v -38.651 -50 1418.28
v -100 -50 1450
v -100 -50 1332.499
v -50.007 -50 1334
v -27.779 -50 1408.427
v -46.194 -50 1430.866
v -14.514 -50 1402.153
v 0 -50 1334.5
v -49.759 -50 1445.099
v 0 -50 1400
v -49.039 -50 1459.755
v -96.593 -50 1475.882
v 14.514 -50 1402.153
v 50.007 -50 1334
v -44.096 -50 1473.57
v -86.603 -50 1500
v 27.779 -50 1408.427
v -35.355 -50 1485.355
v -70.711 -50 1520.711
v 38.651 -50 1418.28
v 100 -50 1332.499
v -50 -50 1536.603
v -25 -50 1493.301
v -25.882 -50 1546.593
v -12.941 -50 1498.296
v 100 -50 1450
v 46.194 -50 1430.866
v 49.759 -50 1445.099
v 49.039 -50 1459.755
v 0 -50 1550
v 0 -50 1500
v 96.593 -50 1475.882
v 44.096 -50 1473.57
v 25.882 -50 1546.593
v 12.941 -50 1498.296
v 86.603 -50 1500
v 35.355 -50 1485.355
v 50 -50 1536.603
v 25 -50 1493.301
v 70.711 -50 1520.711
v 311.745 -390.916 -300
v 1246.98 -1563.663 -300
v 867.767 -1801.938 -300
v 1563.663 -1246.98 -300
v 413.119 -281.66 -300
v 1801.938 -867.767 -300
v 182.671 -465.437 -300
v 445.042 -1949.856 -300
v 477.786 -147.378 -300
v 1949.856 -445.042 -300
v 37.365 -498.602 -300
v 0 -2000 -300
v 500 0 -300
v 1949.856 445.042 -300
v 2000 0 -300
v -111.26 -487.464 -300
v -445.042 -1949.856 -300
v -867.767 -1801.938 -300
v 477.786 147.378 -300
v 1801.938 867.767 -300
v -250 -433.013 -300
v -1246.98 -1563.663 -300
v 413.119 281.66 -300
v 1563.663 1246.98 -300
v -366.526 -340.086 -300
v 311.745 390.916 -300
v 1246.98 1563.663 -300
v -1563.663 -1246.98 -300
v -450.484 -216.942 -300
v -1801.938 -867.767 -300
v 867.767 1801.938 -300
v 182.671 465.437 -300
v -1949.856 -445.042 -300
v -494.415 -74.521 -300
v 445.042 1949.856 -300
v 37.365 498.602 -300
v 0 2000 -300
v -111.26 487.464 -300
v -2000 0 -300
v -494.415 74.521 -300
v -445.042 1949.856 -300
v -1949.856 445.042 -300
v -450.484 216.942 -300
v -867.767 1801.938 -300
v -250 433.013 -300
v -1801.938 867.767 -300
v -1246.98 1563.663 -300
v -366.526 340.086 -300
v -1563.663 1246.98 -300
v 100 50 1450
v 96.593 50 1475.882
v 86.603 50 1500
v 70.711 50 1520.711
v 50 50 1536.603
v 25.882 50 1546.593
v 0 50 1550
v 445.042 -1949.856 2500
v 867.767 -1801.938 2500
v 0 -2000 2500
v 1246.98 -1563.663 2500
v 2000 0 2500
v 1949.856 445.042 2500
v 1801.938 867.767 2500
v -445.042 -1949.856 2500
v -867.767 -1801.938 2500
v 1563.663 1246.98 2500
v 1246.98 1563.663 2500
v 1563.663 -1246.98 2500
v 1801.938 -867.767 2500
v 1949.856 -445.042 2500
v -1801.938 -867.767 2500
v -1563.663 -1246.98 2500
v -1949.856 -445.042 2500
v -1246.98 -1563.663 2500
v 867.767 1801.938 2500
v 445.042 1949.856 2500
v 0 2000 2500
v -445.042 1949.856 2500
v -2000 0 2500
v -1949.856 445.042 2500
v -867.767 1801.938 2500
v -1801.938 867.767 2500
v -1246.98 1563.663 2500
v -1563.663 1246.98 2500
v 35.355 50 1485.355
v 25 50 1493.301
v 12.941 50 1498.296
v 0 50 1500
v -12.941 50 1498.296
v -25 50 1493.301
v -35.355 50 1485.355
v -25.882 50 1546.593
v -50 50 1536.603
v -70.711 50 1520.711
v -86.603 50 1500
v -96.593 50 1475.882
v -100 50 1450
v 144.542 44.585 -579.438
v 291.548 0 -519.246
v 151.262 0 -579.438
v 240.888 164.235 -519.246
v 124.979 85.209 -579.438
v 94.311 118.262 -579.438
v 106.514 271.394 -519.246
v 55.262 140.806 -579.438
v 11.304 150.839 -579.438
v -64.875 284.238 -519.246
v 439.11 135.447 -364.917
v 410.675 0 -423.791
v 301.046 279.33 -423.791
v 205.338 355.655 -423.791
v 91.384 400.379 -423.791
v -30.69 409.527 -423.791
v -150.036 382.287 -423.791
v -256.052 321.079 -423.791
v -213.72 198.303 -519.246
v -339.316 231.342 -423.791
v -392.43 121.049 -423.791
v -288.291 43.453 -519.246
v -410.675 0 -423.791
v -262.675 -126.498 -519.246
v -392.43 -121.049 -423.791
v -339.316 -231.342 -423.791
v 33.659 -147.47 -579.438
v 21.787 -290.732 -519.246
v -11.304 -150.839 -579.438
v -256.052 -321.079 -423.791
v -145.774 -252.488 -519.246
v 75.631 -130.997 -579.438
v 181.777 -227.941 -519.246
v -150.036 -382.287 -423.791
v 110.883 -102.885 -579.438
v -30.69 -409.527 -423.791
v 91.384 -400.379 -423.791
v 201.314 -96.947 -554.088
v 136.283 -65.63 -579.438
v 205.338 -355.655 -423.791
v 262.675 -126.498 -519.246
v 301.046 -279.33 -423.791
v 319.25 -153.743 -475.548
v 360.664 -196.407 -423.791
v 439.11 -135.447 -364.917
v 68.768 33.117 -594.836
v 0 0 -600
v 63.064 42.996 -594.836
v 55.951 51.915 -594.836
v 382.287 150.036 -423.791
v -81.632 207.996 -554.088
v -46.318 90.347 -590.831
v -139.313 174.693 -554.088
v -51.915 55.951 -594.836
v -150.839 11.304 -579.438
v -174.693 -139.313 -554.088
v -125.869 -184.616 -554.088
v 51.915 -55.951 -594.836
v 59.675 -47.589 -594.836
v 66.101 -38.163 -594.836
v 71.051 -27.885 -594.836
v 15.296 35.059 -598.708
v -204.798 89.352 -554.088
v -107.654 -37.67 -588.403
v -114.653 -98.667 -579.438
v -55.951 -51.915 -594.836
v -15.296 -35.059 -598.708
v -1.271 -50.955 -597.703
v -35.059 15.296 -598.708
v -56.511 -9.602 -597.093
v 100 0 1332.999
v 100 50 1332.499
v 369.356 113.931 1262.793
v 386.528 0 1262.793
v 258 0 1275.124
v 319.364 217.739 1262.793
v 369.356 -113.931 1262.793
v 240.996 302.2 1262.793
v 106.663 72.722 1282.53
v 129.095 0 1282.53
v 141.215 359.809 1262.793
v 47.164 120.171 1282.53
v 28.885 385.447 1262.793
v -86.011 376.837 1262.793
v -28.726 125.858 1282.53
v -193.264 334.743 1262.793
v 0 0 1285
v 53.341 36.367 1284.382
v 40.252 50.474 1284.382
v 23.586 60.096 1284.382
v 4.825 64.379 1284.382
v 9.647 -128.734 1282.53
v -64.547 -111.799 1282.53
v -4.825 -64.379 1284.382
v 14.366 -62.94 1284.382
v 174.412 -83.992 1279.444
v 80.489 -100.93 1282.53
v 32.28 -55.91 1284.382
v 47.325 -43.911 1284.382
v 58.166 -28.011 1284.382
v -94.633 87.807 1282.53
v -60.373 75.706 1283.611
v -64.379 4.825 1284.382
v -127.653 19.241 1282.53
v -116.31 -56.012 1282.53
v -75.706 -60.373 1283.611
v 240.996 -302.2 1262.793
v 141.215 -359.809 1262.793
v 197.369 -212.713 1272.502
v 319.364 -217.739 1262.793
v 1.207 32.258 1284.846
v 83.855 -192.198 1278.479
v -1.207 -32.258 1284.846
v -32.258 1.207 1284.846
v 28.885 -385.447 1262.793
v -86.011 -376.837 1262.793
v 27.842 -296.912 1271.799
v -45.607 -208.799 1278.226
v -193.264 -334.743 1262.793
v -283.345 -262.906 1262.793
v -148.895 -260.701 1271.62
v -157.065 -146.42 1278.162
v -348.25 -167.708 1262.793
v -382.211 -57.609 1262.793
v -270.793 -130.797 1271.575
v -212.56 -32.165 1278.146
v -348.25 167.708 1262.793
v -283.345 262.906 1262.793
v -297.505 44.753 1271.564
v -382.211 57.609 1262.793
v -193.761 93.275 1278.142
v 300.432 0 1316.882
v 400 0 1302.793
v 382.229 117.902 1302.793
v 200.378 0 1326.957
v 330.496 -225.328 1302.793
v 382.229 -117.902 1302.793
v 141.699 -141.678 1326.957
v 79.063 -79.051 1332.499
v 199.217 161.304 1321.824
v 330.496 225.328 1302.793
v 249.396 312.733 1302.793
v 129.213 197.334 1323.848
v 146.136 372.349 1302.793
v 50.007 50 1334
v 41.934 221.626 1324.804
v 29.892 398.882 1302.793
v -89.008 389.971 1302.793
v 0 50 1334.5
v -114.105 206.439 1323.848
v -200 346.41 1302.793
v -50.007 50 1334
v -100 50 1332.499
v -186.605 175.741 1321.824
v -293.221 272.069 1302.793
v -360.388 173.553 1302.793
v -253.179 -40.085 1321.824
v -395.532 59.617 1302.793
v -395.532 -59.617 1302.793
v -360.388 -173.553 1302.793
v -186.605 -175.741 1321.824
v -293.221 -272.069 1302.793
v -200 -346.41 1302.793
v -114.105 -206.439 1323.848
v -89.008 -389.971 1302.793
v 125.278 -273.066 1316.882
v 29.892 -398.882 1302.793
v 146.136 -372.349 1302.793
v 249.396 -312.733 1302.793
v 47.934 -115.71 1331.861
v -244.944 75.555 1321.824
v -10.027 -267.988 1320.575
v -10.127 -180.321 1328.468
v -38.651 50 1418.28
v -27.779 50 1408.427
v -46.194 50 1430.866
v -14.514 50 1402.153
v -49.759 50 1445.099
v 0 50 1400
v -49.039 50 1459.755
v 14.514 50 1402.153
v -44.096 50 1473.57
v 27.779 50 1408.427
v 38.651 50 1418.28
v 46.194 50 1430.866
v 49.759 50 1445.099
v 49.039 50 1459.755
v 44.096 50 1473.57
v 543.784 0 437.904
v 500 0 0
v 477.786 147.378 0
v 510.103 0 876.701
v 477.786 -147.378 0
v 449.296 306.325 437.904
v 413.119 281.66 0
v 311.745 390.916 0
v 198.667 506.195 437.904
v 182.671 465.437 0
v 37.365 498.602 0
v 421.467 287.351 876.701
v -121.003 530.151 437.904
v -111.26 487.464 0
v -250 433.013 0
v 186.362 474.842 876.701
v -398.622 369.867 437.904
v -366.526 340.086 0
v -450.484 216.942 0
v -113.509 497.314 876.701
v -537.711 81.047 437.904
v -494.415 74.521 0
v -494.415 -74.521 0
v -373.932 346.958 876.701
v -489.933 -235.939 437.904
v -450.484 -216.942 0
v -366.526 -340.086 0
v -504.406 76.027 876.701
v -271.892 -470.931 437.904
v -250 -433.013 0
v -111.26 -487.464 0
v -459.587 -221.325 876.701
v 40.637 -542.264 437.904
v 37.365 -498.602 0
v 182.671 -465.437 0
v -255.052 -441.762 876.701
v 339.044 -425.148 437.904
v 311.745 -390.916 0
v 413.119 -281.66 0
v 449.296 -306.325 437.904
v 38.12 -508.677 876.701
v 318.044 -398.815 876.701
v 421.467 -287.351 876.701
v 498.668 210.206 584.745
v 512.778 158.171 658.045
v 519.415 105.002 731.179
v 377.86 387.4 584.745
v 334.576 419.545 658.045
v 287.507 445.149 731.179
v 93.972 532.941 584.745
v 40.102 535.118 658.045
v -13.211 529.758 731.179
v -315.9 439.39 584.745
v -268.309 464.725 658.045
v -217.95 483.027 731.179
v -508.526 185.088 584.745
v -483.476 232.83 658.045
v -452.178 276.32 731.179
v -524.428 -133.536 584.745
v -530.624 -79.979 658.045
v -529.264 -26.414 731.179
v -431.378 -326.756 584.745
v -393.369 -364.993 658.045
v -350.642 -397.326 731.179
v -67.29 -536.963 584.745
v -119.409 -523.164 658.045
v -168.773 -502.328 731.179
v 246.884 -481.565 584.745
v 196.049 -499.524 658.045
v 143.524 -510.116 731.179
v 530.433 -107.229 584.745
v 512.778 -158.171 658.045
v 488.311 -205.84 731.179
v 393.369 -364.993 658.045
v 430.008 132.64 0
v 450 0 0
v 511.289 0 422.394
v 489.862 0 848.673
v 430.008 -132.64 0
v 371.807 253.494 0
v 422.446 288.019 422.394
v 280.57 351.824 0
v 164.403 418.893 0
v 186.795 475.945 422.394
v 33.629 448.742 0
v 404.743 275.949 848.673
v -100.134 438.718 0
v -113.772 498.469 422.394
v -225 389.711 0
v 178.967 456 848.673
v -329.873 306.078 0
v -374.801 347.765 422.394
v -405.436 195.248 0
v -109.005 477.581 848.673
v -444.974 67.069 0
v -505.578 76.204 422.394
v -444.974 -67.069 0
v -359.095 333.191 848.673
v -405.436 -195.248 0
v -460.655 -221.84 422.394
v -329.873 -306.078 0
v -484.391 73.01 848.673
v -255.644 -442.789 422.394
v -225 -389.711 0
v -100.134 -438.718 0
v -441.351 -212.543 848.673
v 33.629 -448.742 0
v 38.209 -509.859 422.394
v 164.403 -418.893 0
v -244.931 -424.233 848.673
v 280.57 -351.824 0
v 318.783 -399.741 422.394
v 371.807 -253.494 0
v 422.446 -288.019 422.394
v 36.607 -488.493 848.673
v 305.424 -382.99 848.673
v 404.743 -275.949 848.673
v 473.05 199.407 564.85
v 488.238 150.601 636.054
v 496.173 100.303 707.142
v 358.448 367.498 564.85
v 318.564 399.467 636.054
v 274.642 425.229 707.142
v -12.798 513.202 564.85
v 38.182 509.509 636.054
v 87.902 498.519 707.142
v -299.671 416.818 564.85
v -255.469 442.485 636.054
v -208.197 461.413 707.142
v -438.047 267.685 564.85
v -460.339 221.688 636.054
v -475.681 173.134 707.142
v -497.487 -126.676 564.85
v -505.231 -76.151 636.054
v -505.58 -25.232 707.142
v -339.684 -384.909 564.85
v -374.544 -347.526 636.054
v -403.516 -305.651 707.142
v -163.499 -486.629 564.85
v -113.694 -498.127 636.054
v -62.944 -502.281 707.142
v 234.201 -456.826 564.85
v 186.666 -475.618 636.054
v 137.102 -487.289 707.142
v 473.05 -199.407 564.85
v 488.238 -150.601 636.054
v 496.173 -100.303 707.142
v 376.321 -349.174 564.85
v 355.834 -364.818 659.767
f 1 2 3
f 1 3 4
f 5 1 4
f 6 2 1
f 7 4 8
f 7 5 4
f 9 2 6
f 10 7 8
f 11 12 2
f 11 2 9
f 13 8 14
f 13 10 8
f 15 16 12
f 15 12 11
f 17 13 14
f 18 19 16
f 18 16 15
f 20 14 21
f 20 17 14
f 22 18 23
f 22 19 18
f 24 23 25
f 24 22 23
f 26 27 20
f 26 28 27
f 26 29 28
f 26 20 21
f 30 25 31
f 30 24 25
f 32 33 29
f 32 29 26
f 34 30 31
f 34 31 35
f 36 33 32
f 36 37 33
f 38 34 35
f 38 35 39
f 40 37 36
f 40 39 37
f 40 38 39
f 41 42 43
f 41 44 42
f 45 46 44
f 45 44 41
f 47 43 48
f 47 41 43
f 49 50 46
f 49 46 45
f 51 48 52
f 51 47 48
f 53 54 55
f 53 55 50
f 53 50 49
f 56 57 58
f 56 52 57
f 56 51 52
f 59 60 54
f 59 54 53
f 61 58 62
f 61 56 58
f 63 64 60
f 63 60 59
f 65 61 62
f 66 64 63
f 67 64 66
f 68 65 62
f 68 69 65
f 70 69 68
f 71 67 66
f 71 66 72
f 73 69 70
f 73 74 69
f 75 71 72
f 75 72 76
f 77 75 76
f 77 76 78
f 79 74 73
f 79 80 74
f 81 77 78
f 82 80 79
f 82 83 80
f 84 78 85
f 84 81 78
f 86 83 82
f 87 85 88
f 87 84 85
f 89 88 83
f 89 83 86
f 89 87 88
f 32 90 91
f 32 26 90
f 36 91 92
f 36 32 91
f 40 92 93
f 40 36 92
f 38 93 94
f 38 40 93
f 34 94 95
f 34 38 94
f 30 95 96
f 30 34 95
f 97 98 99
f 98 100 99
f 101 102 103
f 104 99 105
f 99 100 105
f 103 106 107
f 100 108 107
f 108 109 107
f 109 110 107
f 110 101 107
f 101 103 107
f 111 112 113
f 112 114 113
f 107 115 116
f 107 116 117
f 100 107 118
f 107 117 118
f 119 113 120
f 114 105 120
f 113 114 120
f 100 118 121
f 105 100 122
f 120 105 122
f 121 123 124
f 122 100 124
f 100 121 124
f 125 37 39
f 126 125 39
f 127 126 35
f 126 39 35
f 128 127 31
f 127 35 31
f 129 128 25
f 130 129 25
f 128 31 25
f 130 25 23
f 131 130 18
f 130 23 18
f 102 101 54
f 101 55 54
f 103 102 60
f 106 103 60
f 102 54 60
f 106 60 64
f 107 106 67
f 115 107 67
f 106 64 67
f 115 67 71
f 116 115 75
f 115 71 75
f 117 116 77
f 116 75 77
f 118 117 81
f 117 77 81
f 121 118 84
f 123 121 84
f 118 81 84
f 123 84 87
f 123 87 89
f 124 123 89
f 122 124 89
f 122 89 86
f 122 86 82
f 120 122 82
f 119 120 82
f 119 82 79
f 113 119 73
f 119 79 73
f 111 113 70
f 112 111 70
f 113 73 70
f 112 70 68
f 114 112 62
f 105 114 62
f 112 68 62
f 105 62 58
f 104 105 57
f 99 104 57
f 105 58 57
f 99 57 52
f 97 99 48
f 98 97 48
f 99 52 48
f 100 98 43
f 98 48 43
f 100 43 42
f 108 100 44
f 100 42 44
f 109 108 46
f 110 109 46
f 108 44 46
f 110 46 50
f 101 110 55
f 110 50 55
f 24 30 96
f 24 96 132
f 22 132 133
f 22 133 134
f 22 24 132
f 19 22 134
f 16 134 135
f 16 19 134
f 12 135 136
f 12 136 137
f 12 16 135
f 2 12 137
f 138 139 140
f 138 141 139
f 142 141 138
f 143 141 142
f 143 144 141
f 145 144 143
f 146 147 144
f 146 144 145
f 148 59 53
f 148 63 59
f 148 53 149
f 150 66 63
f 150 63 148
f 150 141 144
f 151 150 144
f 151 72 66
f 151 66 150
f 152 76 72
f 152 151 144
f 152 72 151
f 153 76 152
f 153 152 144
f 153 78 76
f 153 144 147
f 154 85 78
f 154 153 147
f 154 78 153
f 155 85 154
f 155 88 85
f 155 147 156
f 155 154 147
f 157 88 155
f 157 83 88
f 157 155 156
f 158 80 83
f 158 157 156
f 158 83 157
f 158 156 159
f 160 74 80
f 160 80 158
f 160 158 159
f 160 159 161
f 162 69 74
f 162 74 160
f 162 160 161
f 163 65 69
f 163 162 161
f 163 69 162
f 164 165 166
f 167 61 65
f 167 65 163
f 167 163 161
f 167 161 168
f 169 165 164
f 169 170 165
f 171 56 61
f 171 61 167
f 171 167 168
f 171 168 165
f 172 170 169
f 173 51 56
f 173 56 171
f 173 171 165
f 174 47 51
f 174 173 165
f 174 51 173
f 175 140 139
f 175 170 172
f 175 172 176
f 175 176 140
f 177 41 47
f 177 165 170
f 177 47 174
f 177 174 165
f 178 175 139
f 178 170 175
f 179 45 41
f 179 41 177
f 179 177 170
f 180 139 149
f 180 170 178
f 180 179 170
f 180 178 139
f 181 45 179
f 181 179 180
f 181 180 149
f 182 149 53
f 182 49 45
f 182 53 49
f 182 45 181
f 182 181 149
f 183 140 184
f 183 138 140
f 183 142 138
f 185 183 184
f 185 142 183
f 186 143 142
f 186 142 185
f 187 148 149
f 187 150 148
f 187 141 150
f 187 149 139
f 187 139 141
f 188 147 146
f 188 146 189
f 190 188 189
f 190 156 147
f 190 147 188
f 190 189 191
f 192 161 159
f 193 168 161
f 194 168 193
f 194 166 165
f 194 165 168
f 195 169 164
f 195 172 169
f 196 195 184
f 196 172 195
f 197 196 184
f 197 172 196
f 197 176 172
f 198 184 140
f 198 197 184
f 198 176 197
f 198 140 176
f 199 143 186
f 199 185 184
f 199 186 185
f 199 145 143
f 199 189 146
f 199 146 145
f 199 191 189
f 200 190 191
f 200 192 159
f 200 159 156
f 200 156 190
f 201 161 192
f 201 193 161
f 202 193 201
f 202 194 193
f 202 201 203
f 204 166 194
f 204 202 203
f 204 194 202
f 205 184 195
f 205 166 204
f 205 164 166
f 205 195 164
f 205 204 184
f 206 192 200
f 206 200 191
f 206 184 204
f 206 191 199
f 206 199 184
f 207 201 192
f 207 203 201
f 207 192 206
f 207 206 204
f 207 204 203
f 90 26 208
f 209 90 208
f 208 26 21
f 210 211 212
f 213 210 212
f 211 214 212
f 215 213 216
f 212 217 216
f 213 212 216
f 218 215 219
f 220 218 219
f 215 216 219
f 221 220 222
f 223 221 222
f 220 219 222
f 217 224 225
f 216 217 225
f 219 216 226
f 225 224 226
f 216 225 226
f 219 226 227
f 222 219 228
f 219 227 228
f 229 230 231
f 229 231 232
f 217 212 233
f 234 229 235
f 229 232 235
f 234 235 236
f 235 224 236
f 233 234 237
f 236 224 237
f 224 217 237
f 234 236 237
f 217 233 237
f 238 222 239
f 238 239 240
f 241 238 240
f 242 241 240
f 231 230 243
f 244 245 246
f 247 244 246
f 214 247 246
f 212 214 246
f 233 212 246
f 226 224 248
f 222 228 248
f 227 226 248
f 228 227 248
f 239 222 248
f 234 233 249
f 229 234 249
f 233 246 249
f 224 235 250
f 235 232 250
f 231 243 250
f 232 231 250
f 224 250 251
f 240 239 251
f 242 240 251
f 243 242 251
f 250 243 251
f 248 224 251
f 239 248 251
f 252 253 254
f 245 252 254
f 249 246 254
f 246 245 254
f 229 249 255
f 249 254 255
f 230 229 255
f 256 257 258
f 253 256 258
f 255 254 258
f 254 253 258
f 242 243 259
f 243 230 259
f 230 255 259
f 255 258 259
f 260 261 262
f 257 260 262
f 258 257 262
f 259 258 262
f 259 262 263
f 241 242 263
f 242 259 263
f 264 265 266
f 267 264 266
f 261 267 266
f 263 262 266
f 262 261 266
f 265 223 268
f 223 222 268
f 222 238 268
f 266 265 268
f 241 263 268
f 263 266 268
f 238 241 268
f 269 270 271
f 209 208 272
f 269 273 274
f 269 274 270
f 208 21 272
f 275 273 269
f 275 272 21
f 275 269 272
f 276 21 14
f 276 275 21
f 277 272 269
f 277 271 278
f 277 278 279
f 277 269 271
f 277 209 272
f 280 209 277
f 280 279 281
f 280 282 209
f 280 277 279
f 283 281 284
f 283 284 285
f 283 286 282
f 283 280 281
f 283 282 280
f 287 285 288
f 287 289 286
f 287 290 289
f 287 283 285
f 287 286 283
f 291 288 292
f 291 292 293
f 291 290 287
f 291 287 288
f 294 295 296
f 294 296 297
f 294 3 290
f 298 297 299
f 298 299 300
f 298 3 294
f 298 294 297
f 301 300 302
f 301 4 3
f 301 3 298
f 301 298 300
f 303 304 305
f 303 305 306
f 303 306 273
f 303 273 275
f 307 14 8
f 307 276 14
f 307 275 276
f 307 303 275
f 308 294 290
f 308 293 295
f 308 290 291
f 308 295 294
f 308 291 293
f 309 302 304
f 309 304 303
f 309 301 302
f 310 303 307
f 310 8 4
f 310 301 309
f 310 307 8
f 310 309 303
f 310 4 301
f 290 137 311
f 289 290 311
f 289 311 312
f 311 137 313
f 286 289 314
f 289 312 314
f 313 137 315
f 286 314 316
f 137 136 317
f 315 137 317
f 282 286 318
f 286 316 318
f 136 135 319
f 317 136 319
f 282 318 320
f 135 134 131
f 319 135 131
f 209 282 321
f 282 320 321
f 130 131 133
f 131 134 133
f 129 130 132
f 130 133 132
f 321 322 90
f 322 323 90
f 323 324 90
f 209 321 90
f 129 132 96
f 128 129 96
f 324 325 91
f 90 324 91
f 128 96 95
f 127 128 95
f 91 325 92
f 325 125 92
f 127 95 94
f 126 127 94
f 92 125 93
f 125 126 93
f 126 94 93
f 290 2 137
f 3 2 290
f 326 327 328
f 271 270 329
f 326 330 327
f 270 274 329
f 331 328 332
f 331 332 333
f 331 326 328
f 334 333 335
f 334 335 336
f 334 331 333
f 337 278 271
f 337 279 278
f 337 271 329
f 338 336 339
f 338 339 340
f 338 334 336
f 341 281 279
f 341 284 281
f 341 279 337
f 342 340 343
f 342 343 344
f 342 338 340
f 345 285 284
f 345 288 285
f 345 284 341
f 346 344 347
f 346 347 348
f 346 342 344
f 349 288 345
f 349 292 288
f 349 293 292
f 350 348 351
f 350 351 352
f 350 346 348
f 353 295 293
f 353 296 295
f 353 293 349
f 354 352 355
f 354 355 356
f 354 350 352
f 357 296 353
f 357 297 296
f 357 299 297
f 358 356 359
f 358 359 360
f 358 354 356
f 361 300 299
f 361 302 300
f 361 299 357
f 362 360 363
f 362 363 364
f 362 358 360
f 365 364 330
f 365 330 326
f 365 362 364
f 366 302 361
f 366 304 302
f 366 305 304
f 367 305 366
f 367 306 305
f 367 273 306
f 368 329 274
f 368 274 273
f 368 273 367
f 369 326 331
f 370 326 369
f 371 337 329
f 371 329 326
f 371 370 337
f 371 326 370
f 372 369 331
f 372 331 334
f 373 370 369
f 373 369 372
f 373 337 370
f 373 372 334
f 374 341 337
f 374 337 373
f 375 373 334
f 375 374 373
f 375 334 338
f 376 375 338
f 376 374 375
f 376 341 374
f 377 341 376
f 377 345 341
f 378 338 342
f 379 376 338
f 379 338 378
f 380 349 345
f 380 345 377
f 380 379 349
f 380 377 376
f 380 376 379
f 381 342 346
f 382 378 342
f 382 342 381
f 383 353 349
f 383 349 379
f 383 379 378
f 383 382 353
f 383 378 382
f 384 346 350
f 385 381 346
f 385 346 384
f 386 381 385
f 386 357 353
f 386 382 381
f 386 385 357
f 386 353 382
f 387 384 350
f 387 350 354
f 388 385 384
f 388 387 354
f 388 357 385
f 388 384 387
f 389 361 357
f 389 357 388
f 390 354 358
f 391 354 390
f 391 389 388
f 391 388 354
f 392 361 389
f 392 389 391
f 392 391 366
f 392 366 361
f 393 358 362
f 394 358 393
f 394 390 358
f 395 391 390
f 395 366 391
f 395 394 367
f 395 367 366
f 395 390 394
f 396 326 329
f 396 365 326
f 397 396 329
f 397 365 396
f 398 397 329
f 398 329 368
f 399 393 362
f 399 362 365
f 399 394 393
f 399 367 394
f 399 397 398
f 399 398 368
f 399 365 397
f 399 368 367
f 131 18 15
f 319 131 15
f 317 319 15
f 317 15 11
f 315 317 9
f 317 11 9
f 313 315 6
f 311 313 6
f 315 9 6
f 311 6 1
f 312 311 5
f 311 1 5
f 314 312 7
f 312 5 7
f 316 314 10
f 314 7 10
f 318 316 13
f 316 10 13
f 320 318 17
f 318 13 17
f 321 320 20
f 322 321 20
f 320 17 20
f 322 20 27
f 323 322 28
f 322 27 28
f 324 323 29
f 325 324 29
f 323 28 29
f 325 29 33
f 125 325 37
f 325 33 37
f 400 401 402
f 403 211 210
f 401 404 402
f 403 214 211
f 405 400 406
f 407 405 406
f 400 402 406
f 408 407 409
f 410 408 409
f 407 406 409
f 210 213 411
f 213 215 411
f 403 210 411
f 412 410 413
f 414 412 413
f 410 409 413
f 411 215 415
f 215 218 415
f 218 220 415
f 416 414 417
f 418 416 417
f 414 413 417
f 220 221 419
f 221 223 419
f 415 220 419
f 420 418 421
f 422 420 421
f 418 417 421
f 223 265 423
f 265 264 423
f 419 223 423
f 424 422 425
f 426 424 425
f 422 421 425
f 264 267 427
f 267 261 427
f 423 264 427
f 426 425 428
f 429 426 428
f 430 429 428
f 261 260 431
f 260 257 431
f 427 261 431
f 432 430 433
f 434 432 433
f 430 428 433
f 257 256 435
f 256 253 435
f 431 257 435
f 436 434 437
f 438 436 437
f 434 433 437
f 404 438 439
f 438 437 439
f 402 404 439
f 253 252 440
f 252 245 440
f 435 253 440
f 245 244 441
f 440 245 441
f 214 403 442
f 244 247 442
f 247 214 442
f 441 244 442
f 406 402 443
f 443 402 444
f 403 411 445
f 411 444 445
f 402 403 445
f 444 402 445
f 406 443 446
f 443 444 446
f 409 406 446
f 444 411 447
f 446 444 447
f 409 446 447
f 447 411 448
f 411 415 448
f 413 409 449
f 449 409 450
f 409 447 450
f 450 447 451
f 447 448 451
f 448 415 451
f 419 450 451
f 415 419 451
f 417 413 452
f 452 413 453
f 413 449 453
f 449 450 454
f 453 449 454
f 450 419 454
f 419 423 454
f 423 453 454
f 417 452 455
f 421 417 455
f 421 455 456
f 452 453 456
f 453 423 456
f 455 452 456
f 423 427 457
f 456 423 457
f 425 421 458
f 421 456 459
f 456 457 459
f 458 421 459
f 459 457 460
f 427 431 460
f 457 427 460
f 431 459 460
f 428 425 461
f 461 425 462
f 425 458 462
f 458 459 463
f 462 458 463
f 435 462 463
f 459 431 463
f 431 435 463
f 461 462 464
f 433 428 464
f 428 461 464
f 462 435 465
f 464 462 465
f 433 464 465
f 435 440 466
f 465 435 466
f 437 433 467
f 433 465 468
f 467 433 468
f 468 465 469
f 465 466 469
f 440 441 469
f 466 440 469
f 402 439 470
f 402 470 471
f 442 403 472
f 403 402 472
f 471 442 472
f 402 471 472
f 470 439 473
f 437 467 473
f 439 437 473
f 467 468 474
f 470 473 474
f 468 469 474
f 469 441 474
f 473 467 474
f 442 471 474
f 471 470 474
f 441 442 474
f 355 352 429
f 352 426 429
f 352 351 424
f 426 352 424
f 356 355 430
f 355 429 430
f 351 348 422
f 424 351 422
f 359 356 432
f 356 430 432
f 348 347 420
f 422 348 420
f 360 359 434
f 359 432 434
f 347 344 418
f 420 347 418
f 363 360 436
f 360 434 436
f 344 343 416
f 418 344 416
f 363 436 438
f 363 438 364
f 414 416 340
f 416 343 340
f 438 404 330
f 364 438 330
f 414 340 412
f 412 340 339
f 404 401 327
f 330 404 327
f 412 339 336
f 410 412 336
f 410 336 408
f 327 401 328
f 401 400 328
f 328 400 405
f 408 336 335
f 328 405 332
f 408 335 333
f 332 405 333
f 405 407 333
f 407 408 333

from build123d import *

# Parameters (mm, degrees)
PAD001_DEPTH = 250
PAD_DEPTH    = 50


with BuildPart() as air:
    # Sketch009 → Revolution003 (revolve)
    with BuildSketch(Plane.XZ):
        with BuildLine():
            Line((0, 2500), (2000, 2500))
            Line((2000, 2500), (2000, -300))
            Line((500, -300), (2000, -300))
            ThreePointArc((0, -600), (291.547595, -519.245991), (500, -300))
            Line((0, -600), (0, 2500))
        make_face()
    revolve(axis=Axis((0, 0, 0), (0, 0, 1)))


with BuildPart() as pad001:
    # Sketch002 → Pad001 (new body, symmetric)
    with BuildSketch(Plane.XZ):
        with BuildLine():
            ThreePointArc((35.355339, 1485.355339), (0, 1500), (-35.355339, 1485.355339))
            ThreePointArc((-35.355339, 1485.355339), (0, 1400), (35.355339, 1485.355339))
        make_face()
    extrude(amount=PAD001_DEPTH, both=True)


with BuildPart() as pad:
    # Sketch001 → Pad (new body, symmetric)
    with BuildSketch(Plane.XZ):
        with BuildLine():
            ThreePointArc((100, 1450), (70.710678, 1520.710678), (0, 1550))
            ThreePointArc((0, 1550), (-70.710679, 1520.710678), (-100, 1449.999998))
            Line((-100, 1449.999998), (-100, 1300))
            Line((-100, 1300), (0, 1300))
            Line((100, 1300), (0, 1300))
            Line((100, 1450), (100, 1300))
        make_face()
    extrude(amount=PAD_DEPTH, both=True)


with BuildPart() as bell02:
    # Sketch → Revolution (revolve)
    with BuildSketch(Plane.XZ):
        with BuildLine():
            ThreePointArc((386.528, 1262.792536), (193.582712, 1279.44356), (0, 1285))
            Line((0, 1335), (0, 1285))
            ThreePointArc((400, 1302.792536), (200.647278, 1326.935126), (0, 1335))
            ThreePointArc((500, 0), (536.618002, 658.044909), (400, 1302.792536))
            Line((500, 0), (450, 0))
            ThreePointArc((450, 0), (510.93758, 636.054339), (386.528, 1262.792536))
        make_face()
    revolve(axis=Axis((0, 0, 0), (0, 0, 1)))

    # Fusion: union Pad
    add(pad.part)

    # Cut: cut Pad001
    add(pad001.part, mode=Mode.SUBTRACT)


solid = Compound([air.part, bell02.part])
